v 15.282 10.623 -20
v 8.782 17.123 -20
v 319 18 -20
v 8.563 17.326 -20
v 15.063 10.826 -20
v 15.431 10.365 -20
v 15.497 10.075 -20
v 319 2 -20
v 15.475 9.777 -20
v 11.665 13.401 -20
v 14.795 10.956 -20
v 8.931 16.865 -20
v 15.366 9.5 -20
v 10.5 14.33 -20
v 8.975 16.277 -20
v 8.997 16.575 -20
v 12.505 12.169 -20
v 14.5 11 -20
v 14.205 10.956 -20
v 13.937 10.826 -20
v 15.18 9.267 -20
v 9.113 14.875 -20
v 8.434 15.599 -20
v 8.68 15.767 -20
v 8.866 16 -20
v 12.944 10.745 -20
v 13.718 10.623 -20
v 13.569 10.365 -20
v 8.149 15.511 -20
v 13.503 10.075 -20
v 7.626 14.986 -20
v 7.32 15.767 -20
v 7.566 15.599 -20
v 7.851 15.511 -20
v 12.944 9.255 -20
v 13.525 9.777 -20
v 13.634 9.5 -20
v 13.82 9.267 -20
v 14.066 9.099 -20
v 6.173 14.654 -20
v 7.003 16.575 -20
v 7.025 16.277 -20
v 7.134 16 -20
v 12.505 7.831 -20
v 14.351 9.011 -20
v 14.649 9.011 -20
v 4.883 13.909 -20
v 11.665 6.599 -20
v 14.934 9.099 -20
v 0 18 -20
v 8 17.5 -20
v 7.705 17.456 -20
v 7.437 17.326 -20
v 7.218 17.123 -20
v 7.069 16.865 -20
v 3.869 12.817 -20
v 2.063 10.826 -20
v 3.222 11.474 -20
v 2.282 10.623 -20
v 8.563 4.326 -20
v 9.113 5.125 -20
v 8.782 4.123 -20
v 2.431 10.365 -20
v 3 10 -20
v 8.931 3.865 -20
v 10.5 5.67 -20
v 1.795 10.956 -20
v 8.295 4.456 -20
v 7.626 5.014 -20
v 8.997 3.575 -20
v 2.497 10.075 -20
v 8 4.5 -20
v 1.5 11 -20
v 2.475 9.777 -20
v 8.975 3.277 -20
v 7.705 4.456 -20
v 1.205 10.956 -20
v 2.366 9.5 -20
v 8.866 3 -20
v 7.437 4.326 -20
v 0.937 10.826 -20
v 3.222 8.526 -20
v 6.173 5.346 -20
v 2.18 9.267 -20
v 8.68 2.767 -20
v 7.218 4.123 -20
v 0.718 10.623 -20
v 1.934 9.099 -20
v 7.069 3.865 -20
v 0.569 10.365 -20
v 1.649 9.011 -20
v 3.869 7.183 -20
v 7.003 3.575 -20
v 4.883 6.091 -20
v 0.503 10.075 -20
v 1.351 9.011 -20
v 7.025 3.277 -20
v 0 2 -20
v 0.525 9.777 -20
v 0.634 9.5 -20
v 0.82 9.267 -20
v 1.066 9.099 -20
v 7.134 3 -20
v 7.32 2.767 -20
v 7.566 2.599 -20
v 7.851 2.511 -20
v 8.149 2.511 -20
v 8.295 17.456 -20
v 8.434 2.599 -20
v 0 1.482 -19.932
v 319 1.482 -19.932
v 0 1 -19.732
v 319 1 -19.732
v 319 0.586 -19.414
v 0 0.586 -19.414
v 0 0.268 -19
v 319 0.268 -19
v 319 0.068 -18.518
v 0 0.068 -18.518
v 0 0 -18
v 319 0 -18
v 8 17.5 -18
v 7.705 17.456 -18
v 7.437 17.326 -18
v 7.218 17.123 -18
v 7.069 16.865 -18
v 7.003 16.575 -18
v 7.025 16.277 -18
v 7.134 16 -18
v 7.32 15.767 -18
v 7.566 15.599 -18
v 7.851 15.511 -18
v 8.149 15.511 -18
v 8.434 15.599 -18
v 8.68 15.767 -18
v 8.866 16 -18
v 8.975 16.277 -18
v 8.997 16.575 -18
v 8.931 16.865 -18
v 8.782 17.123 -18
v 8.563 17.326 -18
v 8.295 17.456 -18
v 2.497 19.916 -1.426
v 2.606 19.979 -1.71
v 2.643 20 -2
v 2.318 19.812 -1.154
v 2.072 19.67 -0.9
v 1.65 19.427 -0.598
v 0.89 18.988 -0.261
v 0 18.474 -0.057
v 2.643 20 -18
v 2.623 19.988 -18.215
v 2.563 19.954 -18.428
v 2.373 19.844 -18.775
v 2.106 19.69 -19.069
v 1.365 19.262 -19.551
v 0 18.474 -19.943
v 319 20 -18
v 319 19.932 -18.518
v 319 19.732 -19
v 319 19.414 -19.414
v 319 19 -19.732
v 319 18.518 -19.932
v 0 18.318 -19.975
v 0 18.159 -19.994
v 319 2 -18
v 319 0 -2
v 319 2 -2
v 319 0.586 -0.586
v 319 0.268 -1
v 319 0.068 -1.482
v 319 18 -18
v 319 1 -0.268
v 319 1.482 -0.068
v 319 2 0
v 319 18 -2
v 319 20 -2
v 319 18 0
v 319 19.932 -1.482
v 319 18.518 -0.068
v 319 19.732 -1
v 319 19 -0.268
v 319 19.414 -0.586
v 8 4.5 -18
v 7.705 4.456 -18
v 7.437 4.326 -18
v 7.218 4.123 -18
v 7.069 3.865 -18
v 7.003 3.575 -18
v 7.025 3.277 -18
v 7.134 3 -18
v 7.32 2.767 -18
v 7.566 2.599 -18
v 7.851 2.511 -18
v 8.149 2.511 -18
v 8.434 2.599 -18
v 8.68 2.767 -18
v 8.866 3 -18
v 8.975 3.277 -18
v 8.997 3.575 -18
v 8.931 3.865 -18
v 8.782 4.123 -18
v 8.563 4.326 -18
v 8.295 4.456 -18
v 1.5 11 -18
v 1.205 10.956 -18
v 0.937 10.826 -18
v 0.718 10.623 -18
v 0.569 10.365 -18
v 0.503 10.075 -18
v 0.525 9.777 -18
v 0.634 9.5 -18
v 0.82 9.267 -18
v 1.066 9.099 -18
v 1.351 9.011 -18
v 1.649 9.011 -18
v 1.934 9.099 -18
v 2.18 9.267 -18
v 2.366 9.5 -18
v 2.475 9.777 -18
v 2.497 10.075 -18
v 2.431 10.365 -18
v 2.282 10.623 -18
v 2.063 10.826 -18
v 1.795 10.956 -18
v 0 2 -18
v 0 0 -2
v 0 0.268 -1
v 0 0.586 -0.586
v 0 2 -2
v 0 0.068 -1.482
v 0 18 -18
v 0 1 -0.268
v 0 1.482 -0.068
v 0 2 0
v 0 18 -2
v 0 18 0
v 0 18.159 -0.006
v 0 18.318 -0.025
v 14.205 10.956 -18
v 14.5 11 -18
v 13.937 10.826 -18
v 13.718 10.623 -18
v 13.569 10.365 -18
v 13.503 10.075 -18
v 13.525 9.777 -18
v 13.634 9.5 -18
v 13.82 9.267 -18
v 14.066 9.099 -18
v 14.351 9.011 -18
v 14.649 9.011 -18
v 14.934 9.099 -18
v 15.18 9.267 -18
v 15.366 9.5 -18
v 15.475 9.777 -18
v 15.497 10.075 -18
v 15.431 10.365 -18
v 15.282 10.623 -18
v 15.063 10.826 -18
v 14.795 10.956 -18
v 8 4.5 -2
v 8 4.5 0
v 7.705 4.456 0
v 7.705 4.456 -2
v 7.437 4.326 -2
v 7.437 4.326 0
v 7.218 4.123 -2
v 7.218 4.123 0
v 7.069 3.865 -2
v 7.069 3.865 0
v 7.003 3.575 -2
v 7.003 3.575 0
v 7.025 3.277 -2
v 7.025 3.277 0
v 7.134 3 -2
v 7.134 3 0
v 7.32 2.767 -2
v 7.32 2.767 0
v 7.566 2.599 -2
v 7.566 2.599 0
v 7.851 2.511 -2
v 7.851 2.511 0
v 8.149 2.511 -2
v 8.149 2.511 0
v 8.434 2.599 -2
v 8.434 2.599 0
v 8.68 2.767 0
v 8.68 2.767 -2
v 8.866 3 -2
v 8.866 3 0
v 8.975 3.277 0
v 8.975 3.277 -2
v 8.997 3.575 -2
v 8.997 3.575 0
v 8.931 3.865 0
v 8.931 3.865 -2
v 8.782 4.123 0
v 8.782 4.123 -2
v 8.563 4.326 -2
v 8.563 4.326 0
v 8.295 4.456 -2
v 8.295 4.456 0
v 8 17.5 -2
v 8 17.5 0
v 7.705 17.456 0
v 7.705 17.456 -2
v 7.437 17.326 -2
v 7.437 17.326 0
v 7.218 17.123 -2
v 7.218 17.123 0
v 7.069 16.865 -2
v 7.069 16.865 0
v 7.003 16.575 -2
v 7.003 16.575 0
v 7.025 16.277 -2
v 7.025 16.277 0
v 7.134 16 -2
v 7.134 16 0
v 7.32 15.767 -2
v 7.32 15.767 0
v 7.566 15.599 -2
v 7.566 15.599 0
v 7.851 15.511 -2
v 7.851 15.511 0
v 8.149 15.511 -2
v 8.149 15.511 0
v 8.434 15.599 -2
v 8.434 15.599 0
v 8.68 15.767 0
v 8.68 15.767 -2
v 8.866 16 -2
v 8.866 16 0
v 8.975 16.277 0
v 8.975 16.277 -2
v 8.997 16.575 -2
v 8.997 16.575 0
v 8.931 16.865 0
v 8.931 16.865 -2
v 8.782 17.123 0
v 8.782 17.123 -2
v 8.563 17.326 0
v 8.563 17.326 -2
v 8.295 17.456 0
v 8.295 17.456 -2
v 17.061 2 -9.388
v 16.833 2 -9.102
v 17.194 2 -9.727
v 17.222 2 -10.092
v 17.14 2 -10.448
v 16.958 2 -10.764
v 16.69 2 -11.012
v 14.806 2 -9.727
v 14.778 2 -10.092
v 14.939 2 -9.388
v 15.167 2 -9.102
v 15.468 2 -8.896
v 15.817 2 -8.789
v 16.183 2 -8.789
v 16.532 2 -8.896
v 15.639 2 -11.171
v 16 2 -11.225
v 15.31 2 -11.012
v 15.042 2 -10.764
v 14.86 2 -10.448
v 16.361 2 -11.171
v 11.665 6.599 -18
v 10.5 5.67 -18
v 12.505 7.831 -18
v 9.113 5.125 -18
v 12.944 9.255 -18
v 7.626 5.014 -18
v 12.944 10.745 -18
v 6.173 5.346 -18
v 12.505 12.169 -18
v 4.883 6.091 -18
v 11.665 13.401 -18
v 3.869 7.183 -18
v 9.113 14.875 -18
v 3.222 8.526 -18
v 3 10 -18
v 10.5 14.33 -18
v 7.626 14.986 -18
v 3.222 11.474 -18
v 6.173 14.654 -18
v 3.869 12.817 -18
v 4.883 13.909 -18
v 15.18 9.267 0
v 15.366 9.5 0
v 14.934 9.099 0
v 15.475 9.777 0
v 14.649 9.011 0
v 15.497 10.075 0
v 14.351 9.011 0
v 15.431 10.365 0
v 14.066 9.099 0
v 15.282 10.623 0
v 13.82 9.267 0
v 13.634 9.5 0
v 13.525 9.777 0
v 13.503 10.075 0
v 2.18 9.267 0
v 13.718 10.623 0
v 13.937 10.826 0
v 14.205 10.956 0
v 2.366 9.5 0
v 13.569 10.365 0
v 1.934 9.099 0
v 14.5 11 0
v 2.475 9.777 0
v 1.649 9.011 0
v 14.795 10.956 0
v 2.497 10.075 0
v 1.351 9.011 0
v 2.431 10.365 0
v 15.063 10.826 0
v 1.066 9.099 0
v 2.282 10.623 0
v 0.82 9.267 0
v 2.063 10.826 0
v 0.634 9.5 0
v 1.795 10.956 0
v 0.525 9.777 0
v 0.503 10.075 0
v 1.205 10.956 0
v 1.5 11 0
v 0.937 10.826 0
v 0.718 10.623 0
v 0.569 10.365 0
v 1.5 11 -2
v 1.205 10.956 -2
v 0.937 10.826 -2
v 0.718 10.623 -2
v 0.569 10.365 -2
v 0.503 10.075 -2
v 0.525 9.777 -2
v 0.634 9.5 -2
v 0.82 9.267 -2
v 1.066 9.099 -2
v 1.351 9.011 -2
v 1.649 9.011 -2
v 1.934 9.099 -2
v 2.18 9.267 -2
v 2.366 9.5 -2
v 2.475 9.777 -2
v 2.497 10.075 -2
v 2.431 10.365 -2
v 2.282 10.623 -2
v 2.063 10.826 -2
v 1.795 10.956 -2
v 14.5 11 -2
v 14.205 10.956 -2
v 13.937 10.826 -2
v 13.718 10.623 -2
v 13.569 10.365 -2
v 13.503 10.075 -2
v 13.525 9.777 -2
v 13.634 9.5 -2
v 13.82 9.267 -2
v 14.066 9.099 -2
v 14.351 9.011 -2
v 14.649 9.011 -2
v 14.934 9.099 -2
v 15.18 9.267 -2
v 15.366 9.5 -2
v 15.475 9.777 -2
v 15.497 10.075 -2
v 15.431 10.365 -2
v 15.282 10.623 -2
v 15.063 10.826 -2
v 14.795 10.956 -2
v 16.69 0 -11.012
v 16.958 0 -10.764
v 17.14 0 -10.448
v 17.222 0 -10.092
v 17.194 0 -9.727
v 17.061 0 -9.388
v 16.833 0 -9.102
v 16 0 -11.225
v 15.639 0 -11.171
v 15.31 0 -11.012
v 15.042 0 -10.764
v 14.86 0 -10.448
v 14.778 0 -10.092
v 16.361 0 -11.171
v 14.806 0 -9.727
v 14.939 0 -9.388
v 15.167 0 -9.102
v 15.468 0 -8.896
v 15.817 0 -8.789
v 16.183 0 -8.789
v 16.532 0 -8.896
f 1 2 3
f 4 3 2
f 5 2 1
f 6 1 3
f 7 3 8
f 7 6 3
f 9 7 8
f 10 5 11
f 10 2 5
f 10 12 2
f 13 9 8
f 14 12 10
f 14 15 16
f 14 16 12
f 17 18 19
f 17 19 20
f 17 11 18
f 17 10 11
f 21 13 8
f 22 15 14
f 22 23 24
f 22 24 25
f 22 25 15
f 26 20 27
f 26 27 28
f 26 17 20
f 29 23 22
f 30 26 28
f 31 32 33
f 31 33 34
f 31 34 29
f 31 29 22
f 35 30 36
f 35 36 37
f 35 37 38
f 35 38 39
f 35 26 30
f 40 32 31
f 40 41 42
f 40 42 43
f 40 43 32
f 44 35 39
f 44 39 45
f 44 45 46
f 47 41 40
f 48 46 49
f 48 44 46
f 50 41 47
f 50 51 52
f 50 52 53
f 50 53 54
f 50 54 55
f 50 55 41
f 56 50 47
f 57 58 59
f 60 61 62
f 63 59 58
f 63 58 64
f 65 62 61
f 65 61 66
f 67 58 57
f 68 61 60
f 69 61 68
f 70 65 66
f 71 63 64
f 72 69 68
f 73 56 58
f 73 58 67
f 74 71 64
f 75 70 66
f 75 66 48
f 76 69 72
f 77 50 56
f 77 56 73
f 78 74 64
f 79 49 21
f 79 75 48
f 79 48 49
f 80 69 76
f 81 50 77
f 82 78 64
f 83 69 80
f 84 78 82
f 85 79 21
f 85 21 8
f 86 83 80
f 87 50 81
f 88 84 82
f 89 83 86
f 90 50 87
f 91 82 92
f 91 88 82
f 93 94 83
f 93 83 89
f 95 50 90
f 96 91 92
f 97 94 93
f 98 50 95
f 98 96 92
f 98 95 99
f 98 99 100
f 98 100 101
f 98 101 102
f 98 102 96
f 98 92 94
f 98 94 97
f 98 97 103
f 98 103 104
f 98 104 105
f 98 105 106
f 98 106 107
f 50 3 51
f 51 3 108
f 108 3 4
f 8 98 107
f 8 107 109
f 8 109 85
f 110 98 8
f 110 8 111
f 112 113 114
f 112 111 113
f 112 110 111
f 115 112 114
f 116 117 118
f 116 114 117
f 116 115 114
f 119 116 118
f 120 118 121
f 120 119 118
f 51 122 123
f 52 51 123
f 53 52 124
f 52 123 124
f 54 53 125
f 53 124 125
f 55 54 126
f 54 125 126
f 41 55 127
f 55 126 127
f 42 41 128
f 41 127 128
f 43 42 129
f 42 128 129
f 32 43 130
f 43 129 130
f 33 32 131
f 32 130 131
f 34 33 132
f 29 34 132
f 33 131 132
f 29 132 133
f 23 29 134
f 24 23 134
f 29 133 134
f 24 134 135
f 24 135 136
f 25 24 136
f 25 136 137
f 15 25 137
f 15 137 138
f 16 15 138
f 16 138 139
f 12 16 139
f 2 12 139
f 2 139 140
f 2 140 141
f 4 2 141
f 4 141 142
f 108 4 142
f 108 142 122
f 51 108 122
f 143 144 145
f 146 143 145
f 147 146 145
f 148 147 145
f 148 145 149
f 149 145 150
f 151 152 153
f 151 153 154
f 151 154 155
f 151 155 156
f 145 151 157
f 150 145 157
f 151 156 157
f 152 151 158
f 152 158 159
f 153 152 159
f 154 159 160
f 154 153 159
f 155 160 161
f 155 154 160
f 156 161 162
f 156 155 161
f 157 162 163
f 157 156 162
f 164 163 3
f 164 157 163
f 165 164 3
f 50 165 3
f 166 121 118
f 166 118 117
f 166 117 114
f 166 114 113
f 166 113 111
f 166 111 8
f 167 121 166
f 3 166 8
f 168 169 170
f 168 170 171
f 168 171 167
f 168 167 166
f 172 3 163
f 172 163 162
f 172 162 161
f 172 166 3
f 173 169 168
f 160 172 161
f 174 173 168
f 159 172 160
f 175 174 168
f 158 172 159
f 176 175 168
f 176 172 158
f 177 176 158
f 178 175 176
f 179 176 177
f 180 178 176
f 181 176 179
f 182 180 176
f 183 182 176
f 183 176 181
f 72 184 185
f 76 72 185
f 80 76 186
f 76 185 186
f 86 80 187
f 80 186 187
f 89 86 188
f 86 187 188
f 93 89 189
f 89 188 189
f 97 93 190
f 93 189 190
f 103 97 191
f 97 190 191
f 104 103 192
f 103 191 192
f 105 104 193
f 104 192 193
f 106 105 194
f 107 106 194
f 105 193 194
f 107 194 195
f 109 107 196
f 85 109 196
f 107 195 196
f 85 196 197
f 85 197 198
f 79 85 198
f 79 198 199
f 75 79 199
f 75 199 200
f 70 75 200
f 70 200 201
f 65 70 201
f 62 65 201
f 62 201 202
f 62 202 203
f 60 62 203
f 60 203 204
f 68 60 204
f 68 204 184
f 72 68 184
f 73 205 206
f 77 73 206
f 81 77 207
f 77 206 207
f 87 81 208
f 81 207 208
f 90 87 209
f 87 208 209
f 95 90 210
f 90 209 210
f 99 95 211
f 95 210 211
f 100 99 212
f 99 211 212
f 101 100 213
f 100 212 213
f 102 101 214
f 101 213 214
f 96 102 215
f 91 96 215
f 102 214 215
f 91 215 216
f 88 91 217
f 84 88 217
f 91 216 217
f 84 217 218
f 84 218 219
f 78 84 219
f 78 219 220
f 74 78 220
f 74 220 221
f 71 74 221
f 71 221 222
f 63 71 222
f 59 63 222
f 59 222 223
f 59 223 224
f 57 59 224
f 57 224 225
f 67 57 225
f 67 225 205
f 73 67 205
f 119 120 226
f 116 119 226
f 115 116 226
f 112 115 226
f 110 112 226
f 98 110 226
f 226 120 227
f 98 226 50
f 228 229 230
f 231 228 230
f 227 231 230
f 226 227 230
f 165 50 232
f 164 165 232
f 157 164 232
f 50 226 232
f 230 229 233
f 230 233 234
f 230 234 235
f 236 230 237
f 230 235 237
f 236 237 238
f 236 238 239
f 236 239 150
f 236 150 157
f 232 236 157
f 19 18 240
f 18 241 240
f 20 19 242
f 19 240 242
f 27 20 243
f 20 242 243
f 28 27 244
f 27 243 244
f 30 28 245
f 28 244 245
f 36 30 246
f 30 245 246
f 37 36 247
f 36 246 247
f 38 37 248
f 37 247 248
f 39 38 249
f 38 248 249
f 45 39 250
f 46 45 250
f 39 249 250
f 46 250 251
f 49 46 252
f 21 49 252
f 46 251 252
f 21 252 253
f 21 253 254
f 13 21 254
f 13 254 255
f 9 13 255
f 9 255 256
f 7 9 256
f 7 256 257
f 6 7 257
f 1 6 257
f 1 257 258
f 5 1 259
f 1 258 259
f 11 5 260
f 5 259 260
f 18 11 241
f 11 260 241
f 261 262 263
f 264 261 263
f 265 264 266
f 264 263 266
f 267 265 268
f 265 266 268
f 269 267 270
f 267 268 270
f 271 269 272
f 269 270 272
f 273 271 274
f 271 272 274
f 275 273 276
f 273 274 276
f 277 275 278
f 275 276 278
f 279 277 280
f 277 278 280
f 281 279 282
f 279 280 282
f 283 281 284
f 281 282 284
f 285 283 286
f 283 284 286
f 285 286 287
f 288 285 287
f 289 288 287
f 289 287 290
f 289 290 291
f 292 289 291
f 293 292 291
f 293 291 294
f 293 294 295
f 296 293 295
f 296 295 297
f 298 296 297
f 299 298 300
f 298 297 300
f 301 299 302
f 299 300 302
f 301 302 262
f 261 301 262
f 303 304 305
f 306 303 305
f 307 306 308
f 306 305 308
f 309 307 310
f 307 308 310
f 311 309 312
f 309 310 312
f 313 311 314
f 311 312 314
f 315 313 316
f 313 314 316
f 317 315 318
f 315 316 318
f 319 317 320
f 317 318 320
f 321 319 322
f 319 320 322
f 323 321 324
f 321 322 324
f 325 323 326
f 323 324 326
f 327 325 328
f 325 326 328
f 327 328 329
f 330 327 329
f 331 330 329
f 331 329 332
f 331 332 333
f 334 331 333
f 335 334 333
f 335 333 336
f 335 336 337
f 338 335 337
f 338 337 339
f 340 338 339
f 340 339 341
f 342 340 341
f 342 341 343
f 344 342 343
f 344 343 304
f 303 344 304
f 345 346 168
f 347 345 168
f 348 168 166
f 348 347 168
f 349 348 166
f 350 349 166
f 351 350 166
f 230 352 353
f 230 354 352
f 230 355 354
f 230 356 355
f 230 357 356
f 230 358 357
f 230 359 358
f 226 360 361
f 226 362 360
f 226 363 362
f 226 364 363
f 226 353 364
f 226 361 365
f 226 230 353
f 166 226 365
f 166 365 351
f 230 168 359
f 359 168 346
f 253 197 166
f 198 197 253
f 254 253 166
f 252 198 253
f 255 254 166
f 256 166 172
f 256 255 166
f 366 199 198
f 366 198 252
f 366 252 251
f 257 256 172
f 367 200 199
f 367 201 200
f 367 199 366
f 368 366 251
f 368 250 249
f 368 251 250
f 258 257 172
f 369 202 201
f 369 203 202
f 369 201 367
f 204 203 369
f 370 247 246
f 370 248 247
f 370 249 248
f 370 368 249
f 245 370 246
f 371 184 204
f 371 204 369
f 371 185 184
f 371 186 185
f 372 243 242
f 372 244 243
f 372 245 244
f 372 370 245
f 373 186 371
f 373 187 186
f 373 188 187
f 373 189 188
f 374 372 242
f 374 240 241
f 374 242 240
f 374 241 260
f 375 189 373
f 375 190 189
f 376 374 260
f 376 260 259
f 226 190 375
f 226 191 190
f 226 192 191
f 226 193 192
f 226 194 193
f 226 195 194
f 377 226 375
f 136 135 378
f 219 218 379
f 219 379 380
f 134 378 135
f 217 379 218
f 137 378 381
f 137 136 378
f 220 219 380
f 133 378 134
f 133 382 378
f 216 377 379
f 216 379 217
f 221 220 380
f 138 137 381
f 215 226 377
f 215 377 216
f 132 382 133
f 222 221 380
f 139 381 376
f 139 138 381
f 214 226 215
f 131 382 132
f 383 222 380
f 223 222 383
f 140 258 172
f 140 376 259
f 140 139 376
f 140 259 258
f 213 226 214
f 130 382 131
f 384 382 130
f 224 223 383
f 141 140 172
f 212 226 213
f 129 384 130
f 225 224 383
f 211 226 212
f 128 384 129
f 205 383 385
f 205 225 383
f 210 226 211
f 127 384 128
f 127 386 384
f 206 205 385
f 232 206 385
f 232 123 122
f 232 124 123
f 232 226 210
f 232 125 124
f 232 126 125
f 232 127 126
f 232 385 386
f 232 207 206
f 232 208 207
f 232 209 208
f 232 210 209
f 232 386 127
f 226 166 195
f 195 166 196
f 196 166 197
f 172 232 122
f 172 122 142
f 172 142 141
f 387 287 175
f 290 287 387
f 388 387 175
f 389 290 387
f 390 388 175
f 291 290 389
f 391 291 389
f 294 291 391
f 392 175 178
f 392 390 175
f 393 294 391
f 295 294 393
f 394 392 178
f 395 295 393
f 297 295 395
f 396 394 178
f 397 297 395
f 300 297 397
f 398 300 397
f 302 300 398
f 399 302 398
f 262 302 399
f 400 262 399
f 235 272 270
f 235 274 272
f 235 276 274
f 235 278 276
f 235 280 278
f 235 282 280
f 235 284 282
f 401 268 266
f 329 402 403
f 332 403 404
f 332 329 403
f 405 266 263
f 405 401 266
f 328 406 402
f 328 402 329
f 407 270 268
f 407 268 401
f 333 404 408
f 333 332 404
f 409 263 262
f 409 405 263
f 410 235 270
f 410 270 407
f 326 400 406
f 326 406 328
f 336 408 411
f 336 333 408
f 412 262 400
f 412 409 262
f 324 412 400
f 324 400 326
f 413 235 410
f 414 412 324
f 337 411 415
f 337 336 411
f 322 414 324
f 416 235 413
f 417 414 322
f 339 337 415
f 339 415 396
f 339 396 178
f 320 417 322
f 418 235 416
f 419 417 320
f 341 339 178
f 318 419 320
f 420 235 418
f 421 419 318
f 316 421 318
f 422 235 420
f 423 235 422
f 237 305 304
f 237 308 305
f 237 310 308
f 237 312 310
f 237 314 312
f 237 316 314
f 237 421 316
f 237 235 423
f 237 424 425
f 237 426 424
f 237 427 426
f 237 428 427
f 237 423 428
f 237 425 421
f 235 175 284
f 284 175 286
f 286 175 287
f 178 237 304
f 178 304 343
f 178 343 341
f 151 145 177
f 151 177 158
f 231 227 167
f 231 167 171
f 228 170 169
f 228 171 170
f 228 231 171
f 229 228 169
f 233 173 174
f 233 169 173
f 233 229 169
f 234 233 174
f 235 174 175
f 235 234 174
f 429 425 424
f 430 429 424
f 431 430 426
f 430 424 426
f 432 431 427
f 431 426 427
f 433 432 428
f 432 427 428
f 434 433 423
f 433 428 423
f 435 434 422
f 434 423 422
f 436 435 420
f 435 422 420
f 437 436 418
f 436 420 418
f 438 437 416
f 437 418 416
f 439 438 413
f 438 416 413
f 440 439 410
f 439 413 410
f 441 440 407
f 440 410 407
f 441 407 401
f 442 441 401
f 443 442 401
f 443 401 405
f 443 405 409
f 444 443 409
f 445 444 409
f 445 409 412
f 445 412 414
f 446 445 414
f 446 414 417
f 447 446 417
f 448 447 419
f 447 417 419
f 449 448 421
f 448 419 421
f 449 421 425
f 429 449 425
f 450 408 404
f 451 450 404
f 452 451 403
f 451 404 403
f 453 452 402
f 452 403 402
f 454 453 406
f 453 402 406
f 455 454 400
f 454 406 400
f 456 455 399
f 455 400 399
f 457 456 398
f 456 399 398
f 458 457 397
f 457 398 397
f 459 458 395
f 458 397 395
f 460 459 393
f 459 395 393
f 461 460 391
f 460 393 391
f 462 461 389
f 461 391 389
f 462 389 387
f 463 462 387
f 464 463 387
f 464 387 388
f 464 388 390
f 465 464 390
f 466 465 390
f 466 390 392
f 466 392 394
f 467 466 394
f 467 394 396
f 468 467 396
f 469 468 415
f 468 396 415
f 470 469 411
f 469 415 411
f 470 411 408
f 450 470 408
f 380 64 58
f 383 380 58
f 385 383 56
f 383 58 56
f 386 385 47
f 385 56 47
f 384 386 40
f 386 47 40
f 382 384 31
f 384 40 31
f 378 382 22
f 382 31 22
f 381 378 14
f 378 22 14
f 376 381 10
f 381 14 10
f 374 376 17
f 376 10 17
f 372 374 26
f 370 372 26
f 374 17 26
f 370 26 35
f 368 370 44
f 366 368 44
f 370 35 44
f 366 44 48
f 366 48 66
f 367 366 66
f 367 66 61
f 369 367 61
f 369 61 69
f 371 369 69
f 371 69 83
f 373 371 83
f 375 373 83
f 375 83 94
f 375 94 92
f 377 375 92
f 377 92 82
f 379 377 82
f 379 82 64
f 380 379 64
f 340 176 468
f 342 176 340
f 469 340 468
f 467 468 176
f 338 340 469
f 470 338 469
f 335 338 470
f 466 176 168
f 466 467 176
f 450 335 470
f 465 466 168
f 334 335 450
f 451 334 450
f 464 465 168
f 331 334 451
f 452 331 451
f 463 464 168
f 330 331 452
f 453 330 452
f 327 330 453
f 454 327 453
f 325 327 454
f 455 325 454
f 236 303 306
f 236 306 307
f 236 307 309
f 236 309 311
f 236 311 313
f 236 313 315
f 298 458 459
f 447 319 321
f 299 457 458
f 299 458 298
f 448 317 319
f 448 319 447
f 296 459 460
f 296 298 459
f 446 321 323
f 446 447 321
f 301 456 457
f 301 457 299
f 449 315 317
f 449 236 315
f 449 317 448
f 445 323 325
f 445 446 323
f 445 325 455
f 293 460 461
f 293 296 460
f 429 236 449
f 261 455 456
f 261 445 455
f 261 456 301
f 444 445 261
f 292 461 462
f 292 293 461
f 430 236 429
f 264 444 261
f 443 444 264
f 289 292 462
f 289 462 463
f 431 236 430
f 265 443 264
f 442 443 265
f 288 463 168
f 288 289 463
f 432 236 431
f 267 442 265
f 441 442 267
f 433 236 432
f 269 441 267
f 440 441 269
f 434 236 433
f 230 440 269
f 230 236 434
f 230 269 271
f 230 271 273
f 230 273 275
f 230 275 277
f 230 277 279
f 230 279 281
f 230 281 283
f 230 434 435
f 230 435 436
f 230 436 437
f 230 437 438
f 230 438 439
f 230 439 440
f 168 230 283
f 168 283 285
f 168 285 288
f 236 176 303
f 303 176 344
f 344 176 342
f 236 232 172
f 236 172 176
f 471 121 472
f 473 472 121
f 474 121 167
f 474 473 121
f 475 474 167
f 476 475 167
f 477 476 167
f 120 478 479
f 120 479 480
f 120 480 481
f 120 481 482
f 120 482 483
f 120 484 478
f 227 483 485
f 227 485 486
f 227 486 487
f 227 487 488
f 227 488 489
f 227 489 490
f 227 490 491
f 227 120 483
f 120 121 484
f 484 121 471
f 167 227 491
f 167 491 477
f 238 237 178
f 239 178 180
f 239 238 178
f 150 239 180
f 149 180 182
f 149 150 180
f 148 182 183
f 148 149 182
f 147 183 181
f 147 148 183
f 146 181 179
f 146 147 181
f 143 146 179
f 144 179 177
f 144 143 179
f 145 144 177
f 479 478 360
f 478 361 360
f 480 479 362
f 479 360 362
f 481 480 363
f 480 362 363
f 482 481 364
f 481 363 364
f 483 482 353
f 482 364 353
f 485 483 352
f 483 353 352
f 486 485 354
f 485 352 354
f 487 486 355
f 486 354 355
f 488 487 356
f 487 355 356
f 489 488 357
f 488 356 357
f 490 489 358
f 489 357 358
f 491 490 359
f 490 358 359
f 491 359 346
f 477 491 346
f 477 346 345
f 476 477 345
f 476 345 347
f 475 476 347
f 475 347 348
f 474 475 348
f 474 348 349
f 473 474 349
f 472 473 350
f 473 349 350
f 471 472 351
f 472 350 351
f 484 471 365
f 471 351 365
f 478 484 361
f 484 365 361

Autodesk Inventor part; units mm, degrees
ref_plane "YZ Plane" through (0, 0, 0) normal (1, 0, 0) x (0, 1, 0)
ref_plane "XZ Plane" through (0, 0, 0) normal (0, 1, 0) x (-1, 0, 0)
ref_plane "XY Plane" through (0, 0, 0) normal (0, 0, 1) x (1, 0, 0)
sketch "Sketch1" plane through (0, 0, 0) normal (1, 0, 0) x (0, 1, 0)
  line L0 (2, 0) -> (18, 0)
  line L1 (20, -2) -> (20, -18)
  line L2 (18, -20) -> (2, -20)
  line L3 (0, -18) -> (0, -2)
  line L4 (18, -18) -> (18, -2)
  line L5 (18, -2) -> (2, -2)
  line L6 (2, -2) -> (2, -18)
  line L7 (2, -18) -> (18, -18)
  arc A0 (20, -2) -> (18, 0) centre (18, -2) ccw
  arc A1 (18, -20) -> (20, -18) centre (18, -18) ccw
  arc A2 (0, -18) -> (2, -20) centre (2, -18) ccw
  arc A3 (2, 0) -> (0, -2) centre (2, -2) ccw
  point P0 (0, 0)
  point P1 (20, -20)
  point P2 (20, 0)
  point P3 (0, -20)
  dimension "d0" = 20
  dimension "d1" = 20
  dimension "d2" = 2
  dimension "d5" = 2
extrude "Extrusion1" add sketch "Sketch1" along normal blind 319
sketch "Sketch2" plane through (0, 0, -18) normal (0, -1, 0) x (1, 0, 0)
  line L0 (0, 16) -> (0, 0) projected
  line L1 (0, 0) -> (319, 0) projected
  point P0 (0, 18)
  point P1 (16, 8)
  dimension "d6" = 16
  dimension "d7" = 8
hole "Hole1" at (16, 0, -10) direction (0, 1, 0) diameter 2.45 depth 2
sketch "Sketch4" plane through (0, 2, -20) normal (0, 0, -1) x (-1, 0, 0)
  line L0 (0, 0) -> (0, 16) projected
  line L1 (0, 16) -> (-319, 16) projected
  line L2 (0, 0) -> (-16, 0)
  line L3 (-16, 0) -> (-16, 16)
  line L4 (-16, 16) -> (0, 16)
  line L5 (0, 16) -> (0, 0)
  circle A0 centre (-8, 8) radius 8
  circle A1 centre (-8, 8) radius 5
  circle A2 centre (-8, 8) radius 6.5
  line L6 (0, 18) -> (-319, 18) projected
  line L7 (-2.6429, 18) -> (0, 16.4741)
  line L8 (-2.6429, 18) -> (-0.6491, 18) construction
  line L9 (0, 18) -> (0, 16) projected
  point P0 (0, -2)
  point P1 (-8, 1.5)
  point P2 (-1.5, 8)
  point P3 (-8, 14.5)
  point P4 (-14.5, 8)
  dimension "d21" = 10
  dimension "d22" = 13
  dimension "d30" = 30
  dimension "d33" = 2.6429
extrude "Extrusion3" cut sketch "Sketch4" against normal up to surface (2 mm away) contours A1
hole "Hole2" at (8, 3.5, -20) at (1.5, 10, -20) at (14.5, 10, -20) at (8, 16.5, -20) direction (0, 0, 1) diameter 2 end through all
extrude "Extrusion4" cut sketch "Sketch4" against normal up to next contours L7 L6 L9
properties part number "rockerpivotarm"
